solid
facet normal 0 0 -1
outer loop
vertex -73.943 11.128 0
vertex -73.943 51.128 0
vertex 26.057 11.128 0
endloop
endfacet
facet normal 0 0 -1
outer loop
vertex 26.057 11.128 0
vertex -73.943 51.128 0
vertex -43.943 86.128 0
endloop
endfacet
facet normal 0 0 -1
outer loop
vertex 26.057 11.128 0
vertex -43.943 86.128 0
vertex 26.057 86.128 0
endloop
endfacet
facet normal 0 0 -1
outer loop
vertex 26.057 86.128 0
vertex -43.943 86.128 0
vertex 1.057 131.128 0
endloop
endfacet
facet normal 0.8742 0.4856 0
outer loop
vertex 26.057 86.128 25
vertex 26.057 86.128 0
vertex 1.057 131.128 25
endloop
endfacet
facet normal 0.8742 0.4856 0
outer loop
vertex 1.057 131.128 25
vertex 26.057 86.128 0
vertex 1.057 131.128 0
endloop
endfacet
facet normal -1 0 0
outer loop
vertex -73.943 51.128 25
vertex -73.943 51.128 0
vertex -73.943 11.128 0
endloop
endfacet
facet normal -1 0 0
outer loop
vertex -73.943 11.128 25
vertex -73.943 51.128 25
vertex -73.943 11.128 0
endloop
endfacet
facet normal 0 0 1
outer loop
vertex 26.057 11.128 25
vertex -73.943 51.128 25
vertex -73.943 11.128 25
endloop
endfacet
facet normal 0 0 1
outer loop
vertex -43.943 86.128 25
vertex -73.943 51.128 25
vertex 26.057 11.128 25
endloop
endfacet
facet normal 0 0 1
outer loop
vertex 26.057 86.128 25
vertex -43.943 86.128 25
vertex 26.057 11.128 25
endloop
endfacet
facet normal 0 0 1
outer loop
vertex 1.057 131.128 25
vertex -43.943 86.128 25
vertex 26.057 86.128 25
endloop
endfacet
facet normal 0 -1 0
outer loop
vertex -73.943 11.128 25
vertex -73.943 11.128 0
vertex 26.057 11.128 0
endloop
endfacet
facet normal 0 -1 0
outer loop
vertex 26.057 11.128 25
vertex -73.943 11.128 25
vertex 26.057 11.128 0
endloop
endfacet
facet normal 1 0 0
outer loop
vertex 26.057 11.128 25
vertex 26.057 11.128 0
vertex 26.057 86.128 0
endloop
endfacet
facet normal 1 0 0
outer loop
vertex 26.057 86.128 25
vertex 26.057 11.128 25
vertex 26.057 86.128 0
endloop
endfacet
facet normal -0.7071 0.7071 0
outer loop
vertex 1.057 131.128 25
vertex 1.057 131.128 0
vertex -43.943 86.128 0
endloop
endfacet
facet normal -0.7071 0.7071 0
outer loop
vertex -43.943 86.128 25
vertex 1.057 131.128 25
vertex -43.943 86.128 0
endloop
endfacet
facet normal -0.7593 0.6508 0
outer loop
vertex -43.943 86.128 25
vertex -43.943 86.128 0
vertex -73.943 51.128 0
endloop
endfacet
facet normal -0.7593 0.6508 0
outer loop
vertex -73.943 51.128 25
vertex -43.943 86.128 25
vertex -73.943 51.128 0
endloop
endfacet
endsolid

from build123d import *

# Parameters (mm, degrees)
F0_W     = 100
F0_H     = 20
F1_DEPTH = 25


with BuildPart() as f1:
    # F0 (on Top) → F1 (new body)
    with BuildSketch(Plane.XY):
        Polygon((1.057282, 131.128362), (-43.942718, 86.128362), (26.057282, 86.128362), align=None)
        Polygon((-43.942718, 86.128362), (-73.942718, 51.128362), (26.057282, 51.128362), (26.057282, 86.128362), align=None)
        with Locations((-23.942718, 41.128362)):
            Rectangle(F0_W, F0_H)
        with Locations((-23.942718, 21.128362)):
            Rectangle(F0_W, F0_H)
    extrude(amount=F1_DEPTH)


solid = f1.part
